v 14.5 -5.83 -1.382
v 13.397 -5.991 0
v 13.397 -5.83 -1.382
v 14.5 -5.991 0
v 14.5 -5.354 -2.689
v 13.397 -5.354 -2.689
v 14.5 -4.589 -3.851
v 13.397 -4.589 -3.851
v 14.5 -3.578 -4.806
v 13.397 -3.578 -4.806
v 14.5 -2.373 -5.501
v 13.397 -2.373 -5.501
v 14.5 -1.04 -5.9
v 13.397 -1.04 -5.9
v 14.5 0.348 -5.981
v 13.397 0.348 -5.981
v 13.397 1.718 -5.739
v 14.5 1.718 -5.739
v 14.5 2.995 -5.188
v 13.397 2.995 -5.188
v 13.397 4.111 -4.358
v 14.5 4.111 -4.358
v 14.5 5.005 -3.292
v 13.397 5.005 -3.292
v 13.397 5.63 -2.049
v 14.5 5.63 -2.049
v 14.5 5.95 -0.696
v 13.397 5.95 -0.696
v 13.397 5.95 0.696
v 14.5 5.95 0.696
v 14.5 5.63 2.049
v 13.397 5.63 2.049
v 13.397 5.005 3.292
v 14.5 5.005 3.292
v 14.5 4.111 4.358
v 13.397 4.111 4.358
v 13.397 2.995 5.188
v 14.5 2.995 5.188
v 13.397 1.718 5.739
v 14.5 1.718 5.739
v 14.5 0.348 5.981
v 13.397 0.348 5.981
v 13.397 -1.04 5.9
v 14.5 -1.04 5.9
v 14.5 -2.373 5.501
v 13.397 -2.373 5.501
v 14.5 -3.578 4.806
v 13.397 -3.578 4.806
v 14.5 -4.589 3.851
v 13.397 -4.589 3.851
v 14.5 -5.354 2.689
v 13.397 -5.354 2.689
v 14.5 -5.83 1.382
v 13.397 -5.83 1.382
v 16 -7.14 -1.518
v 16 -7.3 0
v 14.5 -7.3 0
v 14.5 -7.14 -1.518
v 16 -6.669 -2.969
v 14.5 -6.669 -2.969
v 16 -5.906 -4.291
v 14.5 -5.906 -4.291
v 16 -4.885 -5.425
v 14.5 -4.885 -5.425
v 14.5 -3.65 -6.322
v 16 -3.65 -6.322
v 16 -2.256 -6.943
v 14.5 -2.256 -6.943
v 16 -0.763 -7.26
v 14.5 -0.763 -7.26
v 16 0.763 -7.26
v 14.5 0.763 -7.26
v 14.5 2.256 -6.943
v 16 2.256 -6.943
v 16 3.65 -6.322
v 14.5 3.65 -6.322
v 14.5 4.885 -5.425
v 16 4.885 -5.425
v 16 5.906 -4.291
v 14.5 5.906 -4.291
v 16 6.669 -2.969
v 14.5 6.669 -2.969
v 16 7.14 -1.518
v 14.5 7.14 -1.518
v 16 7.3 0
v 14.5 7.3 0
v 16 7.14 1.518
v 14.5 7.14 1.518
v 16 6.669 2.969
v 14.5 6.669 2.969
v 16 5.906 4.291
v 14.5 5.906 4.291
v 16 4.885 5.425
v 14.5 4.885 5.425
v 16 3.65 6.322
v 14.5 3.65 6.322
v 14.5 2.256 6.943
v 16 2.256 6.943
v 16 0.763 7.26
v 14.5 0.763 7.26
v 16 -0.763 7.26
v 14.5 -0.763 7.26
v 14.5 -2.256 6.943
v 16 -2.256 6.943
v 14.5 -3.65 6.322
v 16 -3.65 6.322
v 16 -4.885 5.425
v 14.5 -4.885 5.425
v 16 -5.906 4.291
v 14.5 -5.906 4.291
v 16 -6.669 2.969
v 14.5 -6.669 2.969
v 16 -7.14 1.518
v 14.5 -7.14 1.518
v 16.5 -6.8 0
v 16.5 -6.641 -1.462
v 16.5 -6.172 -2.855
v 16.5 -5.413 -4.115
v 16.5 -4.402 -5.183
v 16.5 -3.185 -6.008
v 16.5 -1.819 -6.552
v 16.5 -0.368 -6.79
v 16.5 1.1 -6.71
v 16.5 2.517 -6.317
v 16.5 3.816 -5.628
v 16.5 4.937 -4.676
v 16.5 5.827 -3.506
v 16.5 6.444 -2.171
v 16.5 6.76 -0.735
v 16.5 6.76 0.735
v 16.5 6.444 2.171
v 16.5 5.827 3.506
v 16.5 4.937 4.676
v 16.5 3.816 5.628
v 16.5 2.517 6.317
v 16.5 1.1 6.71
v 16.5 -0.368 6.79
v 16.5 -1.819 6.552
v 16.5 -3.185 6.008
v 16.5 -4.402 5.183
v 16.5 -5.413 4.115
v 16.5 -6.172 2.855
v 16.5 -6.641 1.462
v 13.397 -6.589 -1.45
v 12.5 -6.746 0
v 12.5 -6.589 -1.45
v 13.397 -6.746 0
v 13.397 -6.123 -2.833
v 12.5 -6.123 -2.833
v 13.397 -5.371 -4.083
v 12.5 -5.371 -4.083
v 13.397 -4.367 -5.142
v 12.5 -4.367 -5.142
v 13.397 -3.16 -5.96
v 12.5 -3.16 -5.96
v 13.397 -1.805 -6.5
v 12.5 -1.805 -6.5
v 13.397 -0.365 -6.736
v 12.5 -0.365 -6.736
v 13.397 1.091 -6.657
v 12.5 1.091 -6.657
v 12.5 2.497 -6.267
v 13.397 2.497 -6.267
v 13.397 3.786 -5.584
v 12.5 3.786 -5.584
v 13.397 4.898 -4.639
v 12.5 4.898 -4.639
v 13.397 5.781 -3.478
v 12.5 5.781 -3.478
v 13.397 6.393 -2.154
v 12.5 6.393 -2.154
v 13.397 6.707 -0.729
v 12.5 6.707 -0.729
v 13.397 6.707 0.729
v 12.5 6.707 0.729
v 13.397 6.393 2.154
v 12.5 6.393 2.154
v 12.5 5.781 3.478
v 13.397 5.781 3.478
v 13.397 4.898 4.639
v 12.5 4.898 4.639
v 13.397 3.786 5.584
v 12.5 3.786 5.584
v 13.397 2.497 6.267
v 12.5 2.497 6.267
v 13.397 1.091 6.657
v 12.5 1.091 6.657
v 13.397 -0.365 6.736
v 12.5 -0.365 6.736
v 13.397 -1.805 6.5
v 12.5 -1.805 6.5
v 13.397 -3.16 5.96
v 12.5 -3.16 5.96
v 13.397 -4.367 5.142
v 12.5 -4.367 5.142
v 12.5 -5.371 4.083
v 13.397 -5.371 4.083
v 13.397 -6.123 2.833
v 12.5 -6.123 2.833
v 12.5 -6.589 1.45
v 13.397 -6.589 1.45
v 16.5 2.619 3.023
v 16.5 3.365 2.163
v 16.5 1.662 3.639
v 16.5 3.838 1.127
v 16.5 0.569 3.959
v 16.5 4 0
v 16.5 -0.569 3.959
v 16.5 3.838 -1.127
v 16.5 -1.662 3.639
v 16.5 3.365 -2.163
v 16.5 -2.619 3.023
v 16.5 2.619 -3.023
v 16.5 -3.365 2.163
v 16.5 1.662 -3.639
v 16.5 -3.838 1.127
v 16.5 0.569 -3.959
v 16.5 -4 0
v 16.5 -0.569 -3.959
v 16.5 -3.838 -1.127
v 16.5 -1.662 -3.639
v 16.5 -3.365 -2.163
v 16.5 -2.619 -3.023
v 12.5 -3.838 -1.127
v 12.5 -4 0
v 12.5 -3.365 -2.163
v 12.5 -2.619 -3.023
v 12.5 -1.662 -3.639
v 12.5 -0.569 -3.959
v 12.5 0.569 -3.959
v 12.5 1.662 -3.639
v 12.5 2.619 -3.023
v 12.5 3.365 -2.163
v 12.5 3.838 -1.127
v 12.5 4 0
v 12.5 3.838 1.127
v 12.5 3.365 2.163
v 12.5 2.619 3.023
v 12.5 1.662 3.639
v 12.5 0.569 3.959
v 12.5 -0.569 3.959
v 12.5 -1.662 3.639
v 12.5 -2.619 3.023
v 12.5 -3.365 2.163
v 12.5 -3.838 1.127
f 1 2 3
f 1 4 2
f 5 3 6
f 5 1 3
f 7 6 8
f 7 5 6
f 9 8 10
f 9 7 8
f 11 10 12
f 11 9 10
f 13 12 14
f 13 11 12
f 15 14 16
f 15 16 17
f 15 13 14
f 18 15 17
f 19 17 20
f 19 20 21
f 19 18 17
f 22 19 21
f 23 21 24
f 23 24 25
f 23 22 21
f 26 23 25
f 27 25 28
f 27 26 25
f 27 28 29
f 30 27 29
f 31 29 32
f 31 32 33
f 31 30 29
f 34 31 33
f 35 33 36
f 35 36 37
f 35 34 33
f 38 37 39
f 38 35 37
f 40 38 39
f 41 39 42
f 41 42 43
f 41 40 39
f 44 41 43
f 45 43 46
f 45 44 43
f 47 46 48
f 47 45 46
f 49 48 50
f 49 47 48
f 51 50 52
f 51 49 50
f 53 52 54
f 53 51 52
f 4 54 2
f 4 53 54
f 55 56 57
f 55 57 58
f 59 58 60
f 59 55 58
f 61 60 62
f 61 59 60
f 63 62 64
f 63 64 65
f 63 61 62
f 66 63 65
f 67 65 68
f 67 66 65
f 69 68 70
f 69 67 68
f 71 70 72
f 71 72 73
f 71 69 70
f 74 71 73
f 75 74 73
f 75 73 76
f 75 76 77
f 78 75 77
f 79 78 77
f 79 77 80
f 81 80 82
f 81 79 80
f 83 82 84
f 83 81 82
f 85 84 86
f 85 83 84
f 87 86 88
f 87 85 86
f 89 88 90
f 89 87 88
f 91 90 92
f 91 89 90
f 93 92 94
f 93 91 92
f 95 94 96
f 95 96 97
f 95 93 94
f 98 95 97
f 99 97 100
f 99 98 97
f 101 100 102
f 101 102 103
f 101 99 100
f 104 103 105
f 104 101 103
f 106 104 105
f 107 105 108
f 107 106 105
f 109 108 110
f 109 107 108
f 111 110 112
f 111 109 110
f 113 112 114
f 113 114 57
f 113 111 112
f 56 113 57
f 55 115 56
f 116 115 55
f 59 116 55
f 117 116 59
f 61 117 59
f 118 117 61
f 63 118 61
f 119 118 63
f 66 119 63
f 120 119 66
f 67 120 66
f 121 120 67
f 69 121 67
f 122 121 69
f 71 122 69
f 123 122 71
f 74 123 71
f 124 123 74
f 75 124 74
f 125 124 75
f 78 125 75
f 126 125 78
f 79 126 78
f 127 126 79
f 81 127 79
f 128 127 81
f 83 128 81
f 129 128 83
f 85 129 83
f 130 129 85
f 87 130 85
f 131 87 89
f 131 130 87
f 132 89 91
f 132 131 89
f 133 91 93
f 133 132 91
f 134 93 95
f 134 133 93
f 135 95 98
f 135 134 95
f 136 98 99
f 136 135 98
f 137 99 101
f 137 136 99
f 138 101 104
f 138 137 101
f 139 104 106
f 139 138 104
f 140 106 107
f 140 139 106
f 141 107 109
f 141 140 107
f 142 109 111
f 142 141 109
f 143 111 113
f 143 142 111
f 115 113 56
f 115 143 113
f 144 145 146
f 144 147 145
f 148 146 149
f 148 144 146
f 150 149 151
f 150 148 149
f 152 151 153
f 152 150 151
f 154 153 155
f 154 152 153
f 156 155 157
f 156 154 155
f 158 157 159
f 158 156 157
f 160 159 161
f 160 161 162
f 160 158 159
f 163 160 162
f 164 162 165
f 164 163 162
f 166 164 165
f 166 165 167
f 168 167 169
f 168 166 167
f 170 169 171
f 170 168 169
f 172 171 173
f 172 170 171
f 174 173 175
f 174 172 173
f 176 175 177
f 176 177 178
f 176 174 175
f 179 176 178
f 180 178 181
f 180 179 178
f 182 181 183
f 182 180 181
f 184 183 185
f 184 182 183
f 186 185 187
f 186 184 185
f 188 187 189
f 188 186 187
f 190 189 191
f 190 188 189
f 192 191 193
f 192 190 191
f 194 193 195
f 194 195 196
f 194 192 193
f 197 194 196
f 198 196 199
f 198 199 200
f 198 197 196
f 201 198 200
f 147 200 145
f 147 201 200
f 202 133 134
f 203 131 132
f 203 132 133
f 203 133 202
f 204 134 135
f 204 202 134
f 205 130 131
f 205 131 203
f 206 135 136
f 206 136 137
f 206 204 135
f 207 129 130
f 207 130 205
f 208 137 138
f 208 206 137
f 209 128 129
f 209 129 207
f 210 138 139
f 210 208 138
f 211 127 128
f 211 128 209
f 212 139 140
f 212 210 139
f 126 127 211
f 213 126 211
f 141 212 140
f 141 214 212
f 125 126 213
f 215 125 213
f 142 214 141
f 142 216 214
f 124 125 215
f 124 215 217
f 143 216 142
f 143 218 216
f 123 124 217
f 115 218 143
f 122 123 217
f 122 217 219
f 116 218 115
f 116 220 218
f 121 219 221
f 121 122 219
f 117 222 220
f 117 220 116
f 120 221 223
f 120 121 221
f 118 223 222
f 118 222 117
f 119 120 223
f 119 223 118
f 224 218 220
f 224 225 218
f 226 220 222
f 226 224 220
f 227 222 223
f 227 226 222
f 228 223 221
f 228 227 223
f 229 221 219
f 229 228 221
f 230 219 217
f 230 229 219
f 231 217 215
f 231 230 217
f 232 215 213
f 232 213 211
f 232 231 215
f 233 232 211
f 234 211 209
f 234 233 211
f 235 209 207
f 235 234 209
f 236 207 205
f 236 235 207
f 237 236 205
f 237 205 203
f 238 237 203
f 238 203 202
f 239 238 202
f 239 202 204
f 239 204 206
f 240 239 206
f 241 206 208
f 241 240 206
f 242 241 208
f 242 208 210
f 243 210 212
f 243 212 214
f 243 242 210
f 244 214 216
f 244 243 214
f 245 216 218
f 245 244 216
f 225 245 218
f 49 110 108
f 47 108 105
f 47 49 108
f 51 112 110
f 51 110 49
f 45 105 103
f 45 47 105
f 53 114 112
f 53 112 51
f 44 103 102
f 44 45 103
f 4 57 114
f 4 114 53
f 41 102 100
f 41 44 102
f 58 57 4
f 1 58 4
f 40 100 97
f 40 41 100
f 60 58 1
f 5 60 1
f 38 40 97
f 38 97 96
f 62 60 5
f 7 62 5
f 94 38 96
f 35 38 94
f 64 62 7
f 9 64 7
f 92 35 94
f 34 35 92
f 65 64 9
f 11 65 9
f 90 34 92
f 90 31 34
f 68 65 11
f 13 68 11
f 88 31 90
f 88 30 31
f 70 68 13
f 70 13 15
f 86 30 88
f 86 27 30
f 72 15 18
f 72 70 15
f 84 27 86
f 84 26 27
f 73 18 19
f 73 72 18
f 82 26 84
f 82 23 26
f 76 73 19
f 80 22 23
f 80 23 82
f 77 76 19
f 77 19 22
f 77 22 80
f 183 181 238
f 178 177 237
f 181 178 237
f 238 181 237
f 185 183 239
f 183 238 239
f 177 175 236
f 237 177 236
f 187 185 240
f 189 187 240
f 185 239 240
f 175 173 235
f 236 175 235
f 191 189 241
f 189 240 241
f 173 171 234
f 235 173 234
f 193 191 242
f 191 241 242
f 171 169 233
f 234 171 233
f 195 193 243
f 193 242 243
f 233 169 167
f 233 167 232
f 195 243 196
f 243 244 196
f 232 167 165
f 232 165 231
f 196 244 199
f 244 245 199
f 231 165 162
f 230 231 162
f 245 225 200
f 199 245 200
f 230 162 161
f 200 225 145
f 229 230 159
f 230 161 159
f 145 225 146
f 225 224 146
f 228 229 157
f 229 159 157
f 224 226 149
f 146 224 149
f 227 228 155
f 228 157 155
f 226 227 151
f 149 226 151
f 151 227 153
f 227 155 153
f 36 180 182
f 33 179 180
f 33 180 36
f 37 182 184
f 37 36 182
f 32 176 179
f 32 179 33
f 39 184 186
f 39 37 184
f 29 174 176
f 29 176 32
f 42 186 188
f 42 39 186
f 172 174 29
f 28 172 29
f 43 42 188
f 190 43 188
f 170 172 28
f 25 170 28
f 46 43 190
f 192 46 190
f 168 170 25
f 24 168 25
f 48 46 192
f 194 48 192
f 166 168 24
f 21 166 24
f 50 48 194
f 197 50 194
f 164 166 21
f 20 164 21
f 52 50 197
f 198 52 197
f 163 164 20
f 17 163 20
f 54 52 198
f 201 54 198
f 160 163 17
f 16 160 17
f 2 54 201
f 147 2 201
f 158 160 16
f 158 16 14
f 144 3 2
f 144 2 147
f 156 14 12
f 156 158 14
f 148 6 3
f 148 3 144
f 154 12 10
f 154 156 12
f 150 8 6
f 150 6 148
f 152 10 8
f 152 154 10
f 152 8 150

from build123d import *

# Parameters (mm, degrees)
CHAMFER_1_SIZE = 0.5


with BuildPart() as part:
    # Эскиз2 → Повернуть1 (revolve)
    with BuildSketch(Plane.XY, mode=Mode.PRIVATE) as revolve_1_sk:
        Polygon((14.5, 5.990991269), (14.5, 7.3), (16.5, 7.3), (16.5, 4), (12.5, 4), (12.5, 4.990991269), (12.5, 6.746286905), (13.39735467, 6.746286905), (13.39735467, 5.990991269), align=None)
    revolve(revolve_1_sk.sketch.rotate(Axis((0, 0, 0), (1, 0, 0)), 180), axis=Axis((0, 0, 0), (1, 0, 0)))

    # Фаска1
    chamfer_1_edges = [part.edges().sort_by_distance(p)[0] for p in [
        (16.5, 7.3, 0),
    ]]
    chamfer(chamfer_1_edges, length=CHAMFER_1_SIZE)


solid = part.part
